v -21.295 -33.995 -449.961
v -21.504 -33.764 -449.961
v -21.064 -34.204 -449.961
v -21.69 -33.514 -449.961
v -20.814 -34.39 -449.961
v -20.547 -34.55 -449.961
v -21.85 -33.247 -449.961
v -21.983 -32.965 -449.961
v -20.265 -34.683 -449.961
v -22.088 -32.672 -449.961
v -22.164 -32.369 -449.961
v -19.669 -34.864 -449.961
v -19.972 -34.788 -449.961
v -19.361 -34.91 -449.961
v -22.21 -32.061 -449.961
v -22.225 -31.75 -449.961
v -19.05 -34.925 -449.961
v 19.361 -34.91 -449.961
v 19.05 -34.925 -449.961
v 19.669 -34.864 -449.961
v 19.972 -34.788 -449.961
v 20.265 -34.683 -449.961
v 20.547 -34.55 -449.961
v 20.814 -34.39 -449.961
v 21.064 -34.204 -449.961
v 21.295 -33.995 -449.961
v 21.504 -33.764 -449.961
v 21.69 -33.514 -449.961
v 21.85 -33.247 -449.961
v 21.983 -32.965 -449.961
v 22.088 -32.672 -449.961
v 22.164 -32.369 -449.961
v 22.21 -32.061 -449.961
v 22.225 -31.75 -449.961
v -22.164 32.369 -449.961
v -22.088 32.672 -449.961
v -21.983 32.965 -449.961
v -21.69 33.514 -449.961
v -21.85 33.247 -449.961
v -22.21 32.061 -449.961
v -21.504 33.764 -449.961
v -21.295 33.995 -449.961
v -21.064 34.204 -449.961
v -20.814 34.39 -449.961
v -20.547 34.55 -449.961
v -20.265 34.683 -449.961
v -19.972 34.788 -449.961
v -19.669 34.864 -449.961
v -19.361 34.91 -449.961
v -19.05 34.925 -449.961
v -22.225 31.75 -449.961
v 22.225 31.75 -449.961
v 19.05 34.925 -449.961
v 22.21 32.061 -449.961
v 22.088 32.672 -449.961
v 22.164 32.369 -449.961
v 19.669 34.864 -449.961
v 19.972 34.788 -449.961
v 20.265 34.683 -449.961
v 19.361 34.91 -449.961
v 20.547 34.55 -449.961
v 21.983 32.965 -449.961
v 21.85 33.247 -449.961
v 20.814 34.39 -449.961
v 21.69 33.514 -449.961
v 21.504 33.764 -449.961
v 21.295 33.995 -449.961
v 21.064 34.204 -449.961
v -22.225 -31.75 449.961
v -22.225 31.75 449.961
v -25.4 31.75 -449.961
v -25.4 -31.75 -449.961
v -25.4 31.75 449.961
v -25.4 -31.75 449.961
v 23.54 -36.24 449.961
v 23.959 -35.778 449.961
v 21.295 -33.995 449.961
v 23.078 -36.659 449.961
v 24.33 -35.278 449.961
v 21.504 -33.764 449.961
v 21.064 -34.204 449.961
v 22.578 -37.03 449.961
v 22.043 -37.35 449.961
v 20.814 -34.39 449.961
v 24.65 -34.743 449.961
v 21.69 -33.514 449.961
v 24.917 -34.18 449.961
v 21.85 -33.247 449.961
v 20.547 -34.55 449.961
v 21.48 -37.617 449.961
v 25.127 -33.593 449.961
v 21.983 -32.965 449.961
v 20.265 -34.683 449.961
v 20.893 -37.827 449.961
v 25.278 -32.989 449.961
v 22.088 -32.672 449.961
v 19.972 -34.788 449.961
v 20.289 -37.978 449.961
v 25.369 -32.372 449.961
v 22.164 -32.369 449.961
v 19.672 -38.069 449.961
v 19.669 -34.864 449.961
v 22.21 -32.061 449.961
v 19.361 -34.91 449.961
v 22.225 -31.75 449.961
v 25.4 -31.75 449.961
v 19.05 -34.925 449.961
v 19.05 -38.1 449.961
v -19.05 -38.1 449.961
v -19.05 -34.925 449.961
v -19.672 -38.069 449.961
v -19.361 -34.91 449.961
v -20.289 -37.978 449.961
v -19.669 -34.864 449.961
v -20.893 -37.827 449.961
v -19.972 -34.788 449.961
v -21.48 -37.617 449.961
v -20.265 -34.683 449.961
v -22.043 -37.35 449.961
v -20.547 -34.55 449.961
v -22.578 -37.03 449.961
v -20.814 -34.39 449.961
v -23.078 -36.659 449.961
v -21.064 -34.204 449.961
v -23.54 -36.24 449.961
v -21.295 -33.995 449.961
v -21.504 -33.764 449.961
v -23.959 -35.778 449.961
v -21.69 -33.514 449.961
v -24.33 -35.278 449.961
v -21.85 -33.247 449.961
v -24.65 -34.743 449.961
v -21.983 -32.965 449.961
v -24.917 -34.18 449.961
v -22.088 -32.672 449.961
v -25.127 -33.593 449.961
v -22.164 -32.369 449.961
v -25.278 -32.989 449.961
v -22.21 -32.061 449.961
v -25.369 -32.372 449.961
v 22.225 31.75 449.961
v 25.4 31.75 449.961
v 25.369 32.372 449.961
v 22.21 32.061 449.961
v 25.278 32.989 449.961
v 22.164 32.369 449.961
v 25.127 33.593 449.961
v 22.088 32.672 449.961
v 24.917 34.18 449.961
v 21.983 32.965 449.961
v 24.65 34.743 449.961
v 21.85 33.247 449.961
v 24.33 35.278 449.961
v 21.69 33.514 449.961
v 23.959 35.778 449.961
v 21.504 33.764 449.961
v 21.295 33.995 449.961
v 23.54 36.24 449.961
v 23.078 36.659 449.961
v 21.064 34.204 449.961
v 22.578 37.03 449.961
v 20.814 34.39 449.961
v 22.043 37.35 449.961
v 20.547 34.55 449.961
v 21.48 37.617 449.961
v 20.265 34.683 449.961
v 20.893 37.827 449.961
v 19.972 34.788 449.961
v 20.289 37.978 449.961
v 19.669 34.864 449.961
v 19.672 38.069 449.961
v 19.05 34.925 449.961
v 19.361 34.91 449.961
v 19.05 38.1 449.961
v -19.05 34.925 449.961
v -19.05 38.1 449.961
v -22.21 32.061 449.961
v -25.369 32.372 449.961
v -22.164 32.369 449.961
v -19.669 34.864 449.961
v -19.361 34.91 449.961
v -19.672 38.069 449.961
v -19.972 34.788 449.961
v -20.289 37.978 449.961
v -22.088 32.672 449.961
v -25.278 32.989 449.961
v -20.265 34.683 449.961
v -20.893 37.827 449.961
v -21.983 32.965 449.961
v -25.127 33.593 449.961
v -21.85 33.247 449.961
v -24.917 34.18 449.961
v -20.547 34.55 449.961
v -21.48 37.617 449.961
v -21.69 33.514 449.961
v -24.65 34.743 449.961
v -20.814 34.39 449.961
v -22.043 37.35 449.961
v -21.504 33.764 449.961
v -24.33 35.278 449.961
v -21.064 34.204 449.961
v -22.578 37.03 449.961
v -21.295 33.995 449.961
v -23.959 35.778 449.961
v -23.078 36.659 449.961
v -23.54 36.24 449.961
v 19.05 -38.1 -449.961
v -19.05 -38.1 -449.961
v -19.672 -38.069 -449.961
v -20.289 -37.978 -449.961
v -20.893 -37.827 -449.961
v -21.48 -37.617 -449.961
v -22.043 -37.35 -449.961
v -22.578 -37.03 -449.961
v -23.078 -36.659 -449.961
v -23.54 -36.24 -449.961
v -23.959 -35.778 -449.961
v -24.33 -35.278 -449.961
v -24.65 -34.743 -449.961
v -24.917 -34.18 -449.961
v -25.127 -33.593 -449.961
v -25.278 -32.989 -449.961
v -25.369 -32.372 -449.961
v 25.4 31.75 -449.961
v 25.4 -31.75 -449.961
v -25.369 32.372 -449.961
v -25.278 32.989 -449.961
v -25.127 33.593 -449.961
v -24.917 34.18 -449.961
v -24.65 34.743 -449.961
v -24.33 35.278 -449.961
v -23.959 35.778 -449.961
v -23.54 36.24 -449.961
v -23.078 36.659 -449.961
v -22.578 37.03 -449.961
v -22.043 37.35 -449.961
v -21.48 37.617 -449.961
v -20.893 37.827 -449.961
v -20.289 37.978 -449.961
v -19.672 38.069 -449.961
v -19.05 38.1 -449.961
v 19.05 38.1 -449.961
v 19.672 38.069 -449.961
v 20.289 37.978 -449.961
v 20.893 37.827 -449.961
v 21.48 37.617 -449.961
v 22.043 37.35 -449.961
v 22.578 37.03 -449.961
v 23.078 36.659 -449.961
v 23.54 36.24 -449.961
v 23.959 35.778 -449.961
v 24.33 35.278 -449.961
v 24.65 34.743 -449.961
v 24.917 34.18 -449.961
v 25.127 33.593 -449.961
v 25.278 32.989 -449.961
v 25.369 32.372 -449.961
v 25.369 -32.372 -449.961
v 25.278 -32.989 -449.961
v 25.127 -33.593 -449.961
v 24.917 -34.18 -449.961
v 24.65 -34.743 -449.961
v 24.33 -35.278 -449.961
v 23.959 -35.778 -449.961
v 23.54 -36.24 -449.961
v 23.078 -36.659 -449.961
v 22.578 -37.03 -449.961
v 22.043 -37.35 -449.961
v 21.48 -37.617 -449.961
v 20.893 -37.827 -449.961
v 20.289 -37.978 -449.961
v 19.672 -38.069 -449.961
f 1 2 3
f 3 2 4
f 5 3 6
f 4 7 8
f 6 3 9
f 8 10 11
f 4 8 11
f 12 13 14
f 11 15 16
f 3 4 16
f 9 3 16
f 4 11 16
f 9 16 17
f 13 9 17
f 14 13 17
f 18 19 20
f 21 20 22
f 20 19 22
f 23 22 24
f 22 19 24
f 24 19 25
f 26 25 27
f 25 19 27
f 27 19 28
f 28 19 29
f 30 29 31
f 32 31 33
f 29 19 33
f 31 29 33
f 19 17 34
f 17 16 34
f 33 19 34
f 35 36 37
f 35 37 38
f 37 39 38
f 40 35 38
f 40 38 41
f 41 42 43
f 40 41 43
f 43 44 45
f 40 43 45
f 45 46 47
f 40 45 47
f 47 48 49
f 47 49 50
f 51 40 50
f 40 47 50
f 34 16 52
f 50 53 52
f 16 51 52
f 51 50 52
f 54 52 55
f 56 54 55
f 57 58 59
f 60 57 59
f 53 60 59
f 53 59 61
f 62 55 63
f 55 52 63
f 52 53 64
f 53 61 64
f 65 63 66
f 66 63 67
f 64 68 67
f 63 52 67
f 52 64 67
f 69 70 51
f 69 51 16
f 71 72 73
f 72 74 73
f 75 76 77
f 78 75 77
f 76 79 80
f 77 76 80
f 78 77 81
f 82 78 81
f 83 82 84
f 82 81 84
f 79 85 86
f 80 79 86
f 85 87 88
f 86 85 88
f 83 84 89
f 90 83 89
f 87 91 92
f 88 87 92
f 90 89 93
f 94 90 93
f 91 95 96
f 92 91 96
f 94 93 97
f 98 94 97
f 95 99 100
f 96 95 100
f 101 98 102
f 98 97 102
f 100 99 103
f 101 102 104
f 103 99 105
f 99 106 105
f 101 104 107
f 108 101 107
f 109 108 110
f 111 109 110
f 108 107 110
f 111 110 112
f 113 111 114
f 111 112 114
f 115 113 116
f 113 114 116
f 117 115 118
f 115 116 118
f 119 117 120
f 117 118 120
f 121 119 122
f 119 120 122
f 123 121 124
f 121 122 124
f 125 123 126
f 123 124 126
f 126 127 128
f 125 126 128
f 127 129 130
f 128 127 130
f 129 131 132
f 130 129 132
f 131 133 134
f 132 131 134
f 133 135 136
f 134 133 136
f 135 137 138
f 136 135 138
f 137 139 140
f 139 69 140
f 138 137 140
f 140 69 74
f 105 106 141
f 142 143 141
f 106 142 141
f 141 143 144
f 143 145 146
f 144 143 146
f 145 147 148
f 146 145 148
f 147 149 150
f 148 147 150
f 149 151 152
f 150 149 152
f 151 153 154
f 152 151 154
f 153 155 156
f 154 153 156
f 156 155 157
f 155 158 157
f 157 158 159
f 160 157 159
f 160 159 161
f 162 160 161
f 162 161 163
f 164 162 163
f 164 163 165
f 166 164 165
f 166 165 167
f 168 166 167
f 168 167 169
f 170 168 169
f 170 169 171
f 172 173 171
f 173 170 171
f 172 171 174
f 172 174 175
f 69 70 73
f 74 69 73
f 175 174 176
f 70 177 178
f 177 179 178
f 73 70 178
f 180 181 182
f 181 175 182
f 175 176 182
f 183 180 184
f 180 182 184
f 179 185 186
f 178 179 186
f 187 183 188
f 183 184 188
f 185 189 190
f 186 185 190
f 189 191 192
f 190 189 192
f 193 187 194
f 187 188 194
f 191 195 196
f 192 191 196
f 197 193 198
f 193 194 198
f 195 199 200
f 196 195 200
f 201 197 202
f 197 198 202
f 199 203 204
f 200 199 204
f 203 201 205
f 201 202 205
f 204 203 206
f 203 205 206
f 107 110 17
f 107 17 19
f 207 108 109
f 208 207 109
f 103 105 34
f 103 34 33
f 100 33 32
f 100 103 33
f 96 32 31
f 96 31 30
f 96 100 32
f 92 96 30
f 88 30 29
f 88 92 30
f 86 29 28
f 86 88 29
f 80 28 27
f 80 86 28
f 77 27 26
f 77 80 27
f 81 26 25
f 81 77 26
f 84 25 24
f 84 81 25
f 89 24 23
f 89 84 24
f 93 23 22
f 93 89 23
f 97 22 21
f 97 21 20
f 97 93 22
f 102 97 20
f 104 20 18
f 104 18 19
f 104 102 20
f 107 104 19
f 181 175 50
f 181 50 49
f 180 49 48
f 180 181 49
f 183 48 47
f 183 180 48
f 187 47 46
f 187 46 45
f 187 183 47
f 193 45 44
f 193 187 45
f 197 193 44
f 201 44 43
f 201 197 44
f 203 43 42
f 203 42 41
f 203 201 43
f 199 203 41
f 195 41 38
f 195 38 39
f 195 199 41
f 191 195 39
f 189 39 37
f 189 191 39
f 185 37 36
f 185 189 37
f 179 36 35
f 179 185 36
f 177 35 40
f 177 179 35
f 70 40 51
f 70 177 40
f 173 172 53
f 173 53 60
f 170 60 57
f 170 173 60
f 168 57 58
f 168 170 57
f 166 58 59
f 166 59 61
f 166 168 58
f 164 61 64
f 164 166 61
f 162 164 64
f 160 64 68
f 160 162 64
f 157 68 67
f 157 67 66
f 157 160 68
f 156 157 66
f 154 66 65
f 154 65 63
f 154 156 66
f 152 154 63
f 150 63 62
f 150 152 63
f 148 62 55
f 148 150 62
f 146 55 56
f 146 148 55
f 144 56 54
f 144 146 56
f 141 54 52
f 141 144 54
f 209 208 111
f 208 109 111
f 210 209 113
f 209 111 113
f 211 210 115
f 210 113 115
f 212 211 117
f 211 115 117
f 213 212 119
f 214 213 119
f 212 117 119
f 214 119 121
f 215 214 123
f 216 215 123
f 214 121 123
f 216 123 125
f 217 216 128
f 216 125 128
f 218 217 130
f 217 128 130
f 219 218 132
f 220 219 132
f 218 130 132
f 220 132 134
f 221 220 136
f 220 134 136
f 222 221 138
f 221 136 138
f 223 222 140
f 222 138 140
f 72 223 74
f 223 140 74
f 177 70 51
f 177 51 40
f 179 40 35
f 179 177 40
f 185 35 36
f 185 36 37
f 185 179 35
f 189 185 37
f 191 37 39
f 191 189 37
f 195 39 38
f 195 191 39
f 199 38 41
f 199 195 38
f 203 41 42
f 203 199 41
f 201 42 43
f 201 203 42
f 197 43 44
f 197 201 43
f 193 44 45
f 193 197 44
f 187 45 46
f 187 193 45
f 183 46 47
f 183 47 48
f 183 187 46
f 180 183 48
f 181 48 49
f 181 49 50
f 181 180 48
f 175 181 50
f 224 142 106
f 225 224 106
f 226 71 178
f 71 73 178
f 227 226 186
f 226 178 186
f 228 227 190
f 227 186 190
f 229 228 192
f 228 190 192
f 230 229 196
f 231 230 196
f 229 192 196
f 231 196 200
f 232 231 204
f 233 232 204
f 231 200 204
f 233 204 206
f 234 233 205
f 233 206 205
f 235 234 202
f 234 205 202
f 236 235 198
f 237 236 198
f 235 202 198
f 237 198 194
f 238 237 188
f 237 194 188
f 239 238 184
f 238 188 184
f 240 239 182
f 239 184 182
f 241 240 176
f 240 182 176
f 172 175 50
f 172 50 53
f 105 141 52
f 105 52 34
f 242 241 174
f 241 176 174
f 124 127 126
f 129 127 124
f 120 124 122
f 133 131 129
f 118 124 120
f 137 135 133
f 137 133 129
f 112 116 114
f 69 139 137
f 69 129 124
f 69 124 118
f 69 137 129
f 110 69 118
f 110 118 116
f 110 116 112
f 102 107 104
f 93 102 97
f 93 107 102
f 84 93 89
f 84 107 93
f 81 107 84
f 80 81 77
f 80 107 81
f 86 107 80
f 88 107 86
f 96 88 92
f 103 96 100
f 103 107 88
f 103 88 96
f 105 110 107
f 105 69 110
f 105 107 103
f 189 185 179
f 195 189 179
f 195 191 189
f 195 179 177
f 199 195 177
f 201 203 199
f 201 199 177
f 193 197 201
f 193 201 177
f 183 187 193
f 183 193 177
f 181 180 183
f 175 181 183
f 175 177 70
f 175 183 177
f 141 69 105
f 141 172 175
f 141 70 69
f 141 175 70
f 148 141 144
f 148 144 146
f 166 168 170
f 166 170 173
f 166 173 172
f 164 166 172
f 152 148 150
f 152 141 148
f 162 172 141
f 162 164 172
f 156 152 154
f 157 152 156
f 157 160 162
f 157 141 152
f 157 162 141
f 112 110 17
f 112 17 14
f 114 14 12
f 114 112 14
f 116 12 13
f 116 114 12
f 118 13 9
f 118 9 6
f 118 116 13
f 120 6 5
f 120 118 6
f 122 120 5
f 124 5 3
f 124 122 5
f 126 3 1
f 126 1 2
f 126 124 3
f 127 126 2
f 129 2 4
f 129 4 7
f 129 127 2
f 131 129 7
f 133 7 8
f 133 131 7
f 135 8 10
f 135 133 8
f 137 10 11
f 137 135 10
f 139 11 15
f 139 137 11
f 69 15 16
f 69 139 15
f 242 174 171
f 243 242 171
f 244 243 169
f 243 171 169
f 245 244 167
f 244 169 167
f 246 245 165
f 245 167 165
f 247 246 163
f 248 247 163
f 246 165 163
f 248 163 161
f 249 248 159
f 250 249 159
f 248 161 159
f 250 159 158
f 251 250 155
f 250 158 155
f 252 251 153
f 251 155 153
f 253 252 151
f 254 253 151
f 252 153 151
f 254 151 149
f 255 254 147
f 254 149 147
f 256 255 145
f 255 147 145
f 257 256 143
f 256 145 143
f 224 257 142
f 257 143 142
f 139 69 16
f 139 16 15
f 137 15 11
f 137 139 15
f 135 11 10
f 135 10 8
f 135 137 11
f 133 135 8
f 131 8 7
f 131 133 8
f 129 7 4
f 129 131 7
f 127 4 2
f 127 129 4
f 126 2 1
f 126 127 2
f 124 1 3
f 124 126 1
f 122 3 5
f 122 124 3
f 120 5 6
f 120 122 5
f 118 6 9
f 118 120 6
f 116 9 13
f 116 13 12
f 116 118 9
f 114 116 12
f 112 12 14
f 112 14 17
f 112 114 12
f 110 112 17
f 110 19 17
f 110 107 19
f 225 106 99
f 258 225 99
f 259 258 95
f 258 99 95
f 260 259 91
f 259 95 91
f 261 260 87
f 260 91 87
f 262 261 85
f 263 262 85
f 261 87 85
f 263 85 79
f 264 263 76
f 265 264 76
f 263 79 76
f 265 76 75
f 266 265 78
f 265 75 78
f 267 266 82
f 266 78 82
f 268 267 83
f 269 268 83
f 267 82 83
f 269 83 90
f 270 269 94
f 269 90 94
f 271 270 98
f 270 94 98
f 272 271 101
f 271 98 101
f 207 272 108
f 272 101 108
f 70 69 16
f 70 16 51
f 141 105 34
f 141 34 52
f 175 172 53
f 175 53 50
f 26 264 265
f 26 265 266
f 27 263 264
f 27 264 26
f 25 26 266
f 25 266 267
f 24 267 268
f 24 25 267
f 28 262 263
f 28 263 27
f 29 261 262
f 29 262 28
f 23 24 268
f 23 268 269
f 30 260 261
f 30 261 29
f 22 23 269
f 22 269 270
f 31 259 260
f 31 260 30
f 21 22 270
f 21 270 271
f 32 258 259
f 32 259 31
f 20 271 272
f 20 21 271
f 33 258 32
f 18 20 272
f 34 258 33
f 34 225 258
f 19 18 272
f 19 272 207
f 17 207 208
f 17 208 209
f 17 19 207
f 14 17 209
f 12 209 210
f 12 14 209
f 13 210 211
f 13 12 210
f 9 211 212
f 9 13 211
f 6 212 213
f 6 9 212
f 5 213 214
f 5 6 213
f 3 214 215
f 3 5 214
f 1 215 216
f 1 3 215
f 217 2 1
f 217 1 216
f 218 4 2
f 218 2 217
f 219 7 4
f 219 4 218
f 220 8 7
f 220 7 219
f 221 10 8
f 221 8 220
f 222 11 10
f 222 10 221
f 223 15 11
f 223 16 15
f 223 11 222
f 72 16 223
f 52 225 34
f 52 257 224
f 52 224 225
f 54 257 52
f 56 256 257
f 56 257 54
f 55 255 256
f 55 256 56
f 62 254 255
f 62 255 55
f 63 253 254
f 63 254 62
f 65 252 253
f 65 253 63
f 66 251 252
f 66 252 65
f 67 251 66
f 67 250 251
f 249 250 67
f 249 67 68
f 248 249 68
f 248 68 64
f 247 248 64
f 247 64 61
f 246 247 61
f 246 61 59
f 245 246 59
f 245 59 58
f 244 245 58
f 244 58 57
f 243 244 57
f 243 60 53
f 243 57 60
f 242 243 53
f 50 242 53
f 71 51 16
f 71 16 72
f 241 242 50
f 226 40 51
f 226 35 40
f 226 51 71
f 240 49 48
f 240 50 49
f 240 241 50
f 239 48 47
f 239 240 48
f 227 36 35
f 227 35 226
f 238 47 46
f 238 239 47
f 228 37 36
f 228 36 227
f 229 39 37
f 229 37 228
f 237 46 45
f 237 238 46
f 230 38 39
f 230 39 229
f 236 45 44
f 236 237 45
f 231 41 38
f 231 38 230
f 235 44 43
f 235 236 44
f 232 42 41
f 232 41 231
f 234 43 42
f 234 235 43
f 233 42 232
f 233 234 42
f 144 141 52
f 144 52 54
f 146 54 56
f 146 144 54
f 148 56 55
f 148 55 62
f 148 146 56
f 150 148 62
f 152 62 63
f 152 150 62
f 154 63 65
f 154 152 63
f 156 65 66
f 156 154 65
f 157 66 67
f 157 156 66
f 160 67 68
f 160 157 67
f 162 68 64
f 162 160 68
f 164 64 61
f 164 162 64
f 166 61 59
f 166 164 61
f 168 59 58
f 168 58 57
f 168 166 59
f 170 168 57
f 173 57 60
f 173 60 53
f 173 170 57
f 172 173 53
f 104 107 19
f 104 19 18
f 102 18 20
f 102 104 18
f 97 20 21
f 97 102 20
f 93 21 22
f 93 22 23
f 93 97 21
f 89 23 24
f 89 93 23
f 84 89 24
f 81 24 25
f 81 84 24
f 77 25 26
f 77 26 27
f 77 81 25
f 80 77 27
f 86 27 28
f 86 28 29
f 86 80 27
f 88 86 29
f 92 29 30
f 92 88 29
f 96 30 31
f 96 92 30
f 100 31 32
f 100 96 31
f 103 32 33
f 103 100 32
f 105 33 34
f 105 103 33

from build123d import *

# Parameters (mm, degrees)
BOSS_EXTRUDE2_DEPTH = 449.961
BOSS_EXTRUDE3_DEPTH = 899.922


with BuildPart() as part:
    # Sketch13 → Boss-Extrude2 (new body, symmetric)
    with BuildSketch(Plane.XY):
        with BuildLine():
            Line((19.05, -38.1), (-19.05, -38.1))
            ThreePointArc((-19.05, -38.1), (-23.540128061, -36.240128061), (-25.4, -31.75))
            Line((-25.4, -31.75), (-25.4, 31.75))
            ThreePointArc((-25.4, 31.75), (-23.540128061, 36.240128061), (-19.05, 38.1))
            Line((-19.05, 38.1), (19.05, 38.1))
            ThreePointArc((19.05, 38.1), (23.540128061, 36.240128061), (25.4, 31.75))
            Line((25.4, 31.75), (25.4, -31.75))
            ThreePointArc((25.4, -31.75), (23.540128061, -36.240128061), (19.05, -38.1))
        make_face()
        with BuildLine():
            Line((19.05, -34.925), (-19.05, -34.925))
            ThreePointArc((-19.05, -34.925), (-21.29506403, -33.99506403), (-22.225, -31.75))
            Line((-22.225, -31.75), (-22.225, 31.75))
            ThreePointArc((-22.225, 31.75), (-21.29506403, 33.99506403), (-19.05, 34.925))
            Line((-19.05, 34.925), (19.05, 34.925))
            ThreePointArc((19.05, 34.925), (21.29506403, 33.99506403), (22.225, 31.75))
            Line((22.225, 31.75), (22.225, -31.75))
            ThreePointArc((22.225, -31.75), (21.29506403, -33.99506403), (19.05, -34.925))
        make_face(mode=Mode.SUBTRACT)
    extrude(amount=BOSS_EXTRUDE2_DEPTH, both=True)


with BuildPart() as body_2:
    # Sketch14 → Boss-Extrude3 (new body)
    with BuildSketch(Plane.XY.offset(449.961)):
        with BuildLine():
            Line((-19.05, -34.925), (19.05, -34.925))
            ThreePointArc((19.05, -34.925), (21.29506403, -33.99506403), (22.225, -31.75))
            Line((22.225, -31.75), (22.225, 31.75))
            ThreePointArc((22.225, 31.75), (21.29506403, 33.99506403), (19.05, 34.925))
            Line((19.05, 34.925), (-19.05, 34.925))
            ThreePointArc((-19.05, 34.925), (-21.29506403, 33.99506403), (-22.225, 31.75))
            Line((-22.225, 31.75), (-22.225, -31.75))
            ThreePointArc((-22.225, -31.75), (-21.29506403, -33.99506403), (-19.05, -34.925))
        make_face()
    extrude(amount=-BOSS_EXTRUDE3_DEPTH)


solid = Compound([part.part, body_2.part])
